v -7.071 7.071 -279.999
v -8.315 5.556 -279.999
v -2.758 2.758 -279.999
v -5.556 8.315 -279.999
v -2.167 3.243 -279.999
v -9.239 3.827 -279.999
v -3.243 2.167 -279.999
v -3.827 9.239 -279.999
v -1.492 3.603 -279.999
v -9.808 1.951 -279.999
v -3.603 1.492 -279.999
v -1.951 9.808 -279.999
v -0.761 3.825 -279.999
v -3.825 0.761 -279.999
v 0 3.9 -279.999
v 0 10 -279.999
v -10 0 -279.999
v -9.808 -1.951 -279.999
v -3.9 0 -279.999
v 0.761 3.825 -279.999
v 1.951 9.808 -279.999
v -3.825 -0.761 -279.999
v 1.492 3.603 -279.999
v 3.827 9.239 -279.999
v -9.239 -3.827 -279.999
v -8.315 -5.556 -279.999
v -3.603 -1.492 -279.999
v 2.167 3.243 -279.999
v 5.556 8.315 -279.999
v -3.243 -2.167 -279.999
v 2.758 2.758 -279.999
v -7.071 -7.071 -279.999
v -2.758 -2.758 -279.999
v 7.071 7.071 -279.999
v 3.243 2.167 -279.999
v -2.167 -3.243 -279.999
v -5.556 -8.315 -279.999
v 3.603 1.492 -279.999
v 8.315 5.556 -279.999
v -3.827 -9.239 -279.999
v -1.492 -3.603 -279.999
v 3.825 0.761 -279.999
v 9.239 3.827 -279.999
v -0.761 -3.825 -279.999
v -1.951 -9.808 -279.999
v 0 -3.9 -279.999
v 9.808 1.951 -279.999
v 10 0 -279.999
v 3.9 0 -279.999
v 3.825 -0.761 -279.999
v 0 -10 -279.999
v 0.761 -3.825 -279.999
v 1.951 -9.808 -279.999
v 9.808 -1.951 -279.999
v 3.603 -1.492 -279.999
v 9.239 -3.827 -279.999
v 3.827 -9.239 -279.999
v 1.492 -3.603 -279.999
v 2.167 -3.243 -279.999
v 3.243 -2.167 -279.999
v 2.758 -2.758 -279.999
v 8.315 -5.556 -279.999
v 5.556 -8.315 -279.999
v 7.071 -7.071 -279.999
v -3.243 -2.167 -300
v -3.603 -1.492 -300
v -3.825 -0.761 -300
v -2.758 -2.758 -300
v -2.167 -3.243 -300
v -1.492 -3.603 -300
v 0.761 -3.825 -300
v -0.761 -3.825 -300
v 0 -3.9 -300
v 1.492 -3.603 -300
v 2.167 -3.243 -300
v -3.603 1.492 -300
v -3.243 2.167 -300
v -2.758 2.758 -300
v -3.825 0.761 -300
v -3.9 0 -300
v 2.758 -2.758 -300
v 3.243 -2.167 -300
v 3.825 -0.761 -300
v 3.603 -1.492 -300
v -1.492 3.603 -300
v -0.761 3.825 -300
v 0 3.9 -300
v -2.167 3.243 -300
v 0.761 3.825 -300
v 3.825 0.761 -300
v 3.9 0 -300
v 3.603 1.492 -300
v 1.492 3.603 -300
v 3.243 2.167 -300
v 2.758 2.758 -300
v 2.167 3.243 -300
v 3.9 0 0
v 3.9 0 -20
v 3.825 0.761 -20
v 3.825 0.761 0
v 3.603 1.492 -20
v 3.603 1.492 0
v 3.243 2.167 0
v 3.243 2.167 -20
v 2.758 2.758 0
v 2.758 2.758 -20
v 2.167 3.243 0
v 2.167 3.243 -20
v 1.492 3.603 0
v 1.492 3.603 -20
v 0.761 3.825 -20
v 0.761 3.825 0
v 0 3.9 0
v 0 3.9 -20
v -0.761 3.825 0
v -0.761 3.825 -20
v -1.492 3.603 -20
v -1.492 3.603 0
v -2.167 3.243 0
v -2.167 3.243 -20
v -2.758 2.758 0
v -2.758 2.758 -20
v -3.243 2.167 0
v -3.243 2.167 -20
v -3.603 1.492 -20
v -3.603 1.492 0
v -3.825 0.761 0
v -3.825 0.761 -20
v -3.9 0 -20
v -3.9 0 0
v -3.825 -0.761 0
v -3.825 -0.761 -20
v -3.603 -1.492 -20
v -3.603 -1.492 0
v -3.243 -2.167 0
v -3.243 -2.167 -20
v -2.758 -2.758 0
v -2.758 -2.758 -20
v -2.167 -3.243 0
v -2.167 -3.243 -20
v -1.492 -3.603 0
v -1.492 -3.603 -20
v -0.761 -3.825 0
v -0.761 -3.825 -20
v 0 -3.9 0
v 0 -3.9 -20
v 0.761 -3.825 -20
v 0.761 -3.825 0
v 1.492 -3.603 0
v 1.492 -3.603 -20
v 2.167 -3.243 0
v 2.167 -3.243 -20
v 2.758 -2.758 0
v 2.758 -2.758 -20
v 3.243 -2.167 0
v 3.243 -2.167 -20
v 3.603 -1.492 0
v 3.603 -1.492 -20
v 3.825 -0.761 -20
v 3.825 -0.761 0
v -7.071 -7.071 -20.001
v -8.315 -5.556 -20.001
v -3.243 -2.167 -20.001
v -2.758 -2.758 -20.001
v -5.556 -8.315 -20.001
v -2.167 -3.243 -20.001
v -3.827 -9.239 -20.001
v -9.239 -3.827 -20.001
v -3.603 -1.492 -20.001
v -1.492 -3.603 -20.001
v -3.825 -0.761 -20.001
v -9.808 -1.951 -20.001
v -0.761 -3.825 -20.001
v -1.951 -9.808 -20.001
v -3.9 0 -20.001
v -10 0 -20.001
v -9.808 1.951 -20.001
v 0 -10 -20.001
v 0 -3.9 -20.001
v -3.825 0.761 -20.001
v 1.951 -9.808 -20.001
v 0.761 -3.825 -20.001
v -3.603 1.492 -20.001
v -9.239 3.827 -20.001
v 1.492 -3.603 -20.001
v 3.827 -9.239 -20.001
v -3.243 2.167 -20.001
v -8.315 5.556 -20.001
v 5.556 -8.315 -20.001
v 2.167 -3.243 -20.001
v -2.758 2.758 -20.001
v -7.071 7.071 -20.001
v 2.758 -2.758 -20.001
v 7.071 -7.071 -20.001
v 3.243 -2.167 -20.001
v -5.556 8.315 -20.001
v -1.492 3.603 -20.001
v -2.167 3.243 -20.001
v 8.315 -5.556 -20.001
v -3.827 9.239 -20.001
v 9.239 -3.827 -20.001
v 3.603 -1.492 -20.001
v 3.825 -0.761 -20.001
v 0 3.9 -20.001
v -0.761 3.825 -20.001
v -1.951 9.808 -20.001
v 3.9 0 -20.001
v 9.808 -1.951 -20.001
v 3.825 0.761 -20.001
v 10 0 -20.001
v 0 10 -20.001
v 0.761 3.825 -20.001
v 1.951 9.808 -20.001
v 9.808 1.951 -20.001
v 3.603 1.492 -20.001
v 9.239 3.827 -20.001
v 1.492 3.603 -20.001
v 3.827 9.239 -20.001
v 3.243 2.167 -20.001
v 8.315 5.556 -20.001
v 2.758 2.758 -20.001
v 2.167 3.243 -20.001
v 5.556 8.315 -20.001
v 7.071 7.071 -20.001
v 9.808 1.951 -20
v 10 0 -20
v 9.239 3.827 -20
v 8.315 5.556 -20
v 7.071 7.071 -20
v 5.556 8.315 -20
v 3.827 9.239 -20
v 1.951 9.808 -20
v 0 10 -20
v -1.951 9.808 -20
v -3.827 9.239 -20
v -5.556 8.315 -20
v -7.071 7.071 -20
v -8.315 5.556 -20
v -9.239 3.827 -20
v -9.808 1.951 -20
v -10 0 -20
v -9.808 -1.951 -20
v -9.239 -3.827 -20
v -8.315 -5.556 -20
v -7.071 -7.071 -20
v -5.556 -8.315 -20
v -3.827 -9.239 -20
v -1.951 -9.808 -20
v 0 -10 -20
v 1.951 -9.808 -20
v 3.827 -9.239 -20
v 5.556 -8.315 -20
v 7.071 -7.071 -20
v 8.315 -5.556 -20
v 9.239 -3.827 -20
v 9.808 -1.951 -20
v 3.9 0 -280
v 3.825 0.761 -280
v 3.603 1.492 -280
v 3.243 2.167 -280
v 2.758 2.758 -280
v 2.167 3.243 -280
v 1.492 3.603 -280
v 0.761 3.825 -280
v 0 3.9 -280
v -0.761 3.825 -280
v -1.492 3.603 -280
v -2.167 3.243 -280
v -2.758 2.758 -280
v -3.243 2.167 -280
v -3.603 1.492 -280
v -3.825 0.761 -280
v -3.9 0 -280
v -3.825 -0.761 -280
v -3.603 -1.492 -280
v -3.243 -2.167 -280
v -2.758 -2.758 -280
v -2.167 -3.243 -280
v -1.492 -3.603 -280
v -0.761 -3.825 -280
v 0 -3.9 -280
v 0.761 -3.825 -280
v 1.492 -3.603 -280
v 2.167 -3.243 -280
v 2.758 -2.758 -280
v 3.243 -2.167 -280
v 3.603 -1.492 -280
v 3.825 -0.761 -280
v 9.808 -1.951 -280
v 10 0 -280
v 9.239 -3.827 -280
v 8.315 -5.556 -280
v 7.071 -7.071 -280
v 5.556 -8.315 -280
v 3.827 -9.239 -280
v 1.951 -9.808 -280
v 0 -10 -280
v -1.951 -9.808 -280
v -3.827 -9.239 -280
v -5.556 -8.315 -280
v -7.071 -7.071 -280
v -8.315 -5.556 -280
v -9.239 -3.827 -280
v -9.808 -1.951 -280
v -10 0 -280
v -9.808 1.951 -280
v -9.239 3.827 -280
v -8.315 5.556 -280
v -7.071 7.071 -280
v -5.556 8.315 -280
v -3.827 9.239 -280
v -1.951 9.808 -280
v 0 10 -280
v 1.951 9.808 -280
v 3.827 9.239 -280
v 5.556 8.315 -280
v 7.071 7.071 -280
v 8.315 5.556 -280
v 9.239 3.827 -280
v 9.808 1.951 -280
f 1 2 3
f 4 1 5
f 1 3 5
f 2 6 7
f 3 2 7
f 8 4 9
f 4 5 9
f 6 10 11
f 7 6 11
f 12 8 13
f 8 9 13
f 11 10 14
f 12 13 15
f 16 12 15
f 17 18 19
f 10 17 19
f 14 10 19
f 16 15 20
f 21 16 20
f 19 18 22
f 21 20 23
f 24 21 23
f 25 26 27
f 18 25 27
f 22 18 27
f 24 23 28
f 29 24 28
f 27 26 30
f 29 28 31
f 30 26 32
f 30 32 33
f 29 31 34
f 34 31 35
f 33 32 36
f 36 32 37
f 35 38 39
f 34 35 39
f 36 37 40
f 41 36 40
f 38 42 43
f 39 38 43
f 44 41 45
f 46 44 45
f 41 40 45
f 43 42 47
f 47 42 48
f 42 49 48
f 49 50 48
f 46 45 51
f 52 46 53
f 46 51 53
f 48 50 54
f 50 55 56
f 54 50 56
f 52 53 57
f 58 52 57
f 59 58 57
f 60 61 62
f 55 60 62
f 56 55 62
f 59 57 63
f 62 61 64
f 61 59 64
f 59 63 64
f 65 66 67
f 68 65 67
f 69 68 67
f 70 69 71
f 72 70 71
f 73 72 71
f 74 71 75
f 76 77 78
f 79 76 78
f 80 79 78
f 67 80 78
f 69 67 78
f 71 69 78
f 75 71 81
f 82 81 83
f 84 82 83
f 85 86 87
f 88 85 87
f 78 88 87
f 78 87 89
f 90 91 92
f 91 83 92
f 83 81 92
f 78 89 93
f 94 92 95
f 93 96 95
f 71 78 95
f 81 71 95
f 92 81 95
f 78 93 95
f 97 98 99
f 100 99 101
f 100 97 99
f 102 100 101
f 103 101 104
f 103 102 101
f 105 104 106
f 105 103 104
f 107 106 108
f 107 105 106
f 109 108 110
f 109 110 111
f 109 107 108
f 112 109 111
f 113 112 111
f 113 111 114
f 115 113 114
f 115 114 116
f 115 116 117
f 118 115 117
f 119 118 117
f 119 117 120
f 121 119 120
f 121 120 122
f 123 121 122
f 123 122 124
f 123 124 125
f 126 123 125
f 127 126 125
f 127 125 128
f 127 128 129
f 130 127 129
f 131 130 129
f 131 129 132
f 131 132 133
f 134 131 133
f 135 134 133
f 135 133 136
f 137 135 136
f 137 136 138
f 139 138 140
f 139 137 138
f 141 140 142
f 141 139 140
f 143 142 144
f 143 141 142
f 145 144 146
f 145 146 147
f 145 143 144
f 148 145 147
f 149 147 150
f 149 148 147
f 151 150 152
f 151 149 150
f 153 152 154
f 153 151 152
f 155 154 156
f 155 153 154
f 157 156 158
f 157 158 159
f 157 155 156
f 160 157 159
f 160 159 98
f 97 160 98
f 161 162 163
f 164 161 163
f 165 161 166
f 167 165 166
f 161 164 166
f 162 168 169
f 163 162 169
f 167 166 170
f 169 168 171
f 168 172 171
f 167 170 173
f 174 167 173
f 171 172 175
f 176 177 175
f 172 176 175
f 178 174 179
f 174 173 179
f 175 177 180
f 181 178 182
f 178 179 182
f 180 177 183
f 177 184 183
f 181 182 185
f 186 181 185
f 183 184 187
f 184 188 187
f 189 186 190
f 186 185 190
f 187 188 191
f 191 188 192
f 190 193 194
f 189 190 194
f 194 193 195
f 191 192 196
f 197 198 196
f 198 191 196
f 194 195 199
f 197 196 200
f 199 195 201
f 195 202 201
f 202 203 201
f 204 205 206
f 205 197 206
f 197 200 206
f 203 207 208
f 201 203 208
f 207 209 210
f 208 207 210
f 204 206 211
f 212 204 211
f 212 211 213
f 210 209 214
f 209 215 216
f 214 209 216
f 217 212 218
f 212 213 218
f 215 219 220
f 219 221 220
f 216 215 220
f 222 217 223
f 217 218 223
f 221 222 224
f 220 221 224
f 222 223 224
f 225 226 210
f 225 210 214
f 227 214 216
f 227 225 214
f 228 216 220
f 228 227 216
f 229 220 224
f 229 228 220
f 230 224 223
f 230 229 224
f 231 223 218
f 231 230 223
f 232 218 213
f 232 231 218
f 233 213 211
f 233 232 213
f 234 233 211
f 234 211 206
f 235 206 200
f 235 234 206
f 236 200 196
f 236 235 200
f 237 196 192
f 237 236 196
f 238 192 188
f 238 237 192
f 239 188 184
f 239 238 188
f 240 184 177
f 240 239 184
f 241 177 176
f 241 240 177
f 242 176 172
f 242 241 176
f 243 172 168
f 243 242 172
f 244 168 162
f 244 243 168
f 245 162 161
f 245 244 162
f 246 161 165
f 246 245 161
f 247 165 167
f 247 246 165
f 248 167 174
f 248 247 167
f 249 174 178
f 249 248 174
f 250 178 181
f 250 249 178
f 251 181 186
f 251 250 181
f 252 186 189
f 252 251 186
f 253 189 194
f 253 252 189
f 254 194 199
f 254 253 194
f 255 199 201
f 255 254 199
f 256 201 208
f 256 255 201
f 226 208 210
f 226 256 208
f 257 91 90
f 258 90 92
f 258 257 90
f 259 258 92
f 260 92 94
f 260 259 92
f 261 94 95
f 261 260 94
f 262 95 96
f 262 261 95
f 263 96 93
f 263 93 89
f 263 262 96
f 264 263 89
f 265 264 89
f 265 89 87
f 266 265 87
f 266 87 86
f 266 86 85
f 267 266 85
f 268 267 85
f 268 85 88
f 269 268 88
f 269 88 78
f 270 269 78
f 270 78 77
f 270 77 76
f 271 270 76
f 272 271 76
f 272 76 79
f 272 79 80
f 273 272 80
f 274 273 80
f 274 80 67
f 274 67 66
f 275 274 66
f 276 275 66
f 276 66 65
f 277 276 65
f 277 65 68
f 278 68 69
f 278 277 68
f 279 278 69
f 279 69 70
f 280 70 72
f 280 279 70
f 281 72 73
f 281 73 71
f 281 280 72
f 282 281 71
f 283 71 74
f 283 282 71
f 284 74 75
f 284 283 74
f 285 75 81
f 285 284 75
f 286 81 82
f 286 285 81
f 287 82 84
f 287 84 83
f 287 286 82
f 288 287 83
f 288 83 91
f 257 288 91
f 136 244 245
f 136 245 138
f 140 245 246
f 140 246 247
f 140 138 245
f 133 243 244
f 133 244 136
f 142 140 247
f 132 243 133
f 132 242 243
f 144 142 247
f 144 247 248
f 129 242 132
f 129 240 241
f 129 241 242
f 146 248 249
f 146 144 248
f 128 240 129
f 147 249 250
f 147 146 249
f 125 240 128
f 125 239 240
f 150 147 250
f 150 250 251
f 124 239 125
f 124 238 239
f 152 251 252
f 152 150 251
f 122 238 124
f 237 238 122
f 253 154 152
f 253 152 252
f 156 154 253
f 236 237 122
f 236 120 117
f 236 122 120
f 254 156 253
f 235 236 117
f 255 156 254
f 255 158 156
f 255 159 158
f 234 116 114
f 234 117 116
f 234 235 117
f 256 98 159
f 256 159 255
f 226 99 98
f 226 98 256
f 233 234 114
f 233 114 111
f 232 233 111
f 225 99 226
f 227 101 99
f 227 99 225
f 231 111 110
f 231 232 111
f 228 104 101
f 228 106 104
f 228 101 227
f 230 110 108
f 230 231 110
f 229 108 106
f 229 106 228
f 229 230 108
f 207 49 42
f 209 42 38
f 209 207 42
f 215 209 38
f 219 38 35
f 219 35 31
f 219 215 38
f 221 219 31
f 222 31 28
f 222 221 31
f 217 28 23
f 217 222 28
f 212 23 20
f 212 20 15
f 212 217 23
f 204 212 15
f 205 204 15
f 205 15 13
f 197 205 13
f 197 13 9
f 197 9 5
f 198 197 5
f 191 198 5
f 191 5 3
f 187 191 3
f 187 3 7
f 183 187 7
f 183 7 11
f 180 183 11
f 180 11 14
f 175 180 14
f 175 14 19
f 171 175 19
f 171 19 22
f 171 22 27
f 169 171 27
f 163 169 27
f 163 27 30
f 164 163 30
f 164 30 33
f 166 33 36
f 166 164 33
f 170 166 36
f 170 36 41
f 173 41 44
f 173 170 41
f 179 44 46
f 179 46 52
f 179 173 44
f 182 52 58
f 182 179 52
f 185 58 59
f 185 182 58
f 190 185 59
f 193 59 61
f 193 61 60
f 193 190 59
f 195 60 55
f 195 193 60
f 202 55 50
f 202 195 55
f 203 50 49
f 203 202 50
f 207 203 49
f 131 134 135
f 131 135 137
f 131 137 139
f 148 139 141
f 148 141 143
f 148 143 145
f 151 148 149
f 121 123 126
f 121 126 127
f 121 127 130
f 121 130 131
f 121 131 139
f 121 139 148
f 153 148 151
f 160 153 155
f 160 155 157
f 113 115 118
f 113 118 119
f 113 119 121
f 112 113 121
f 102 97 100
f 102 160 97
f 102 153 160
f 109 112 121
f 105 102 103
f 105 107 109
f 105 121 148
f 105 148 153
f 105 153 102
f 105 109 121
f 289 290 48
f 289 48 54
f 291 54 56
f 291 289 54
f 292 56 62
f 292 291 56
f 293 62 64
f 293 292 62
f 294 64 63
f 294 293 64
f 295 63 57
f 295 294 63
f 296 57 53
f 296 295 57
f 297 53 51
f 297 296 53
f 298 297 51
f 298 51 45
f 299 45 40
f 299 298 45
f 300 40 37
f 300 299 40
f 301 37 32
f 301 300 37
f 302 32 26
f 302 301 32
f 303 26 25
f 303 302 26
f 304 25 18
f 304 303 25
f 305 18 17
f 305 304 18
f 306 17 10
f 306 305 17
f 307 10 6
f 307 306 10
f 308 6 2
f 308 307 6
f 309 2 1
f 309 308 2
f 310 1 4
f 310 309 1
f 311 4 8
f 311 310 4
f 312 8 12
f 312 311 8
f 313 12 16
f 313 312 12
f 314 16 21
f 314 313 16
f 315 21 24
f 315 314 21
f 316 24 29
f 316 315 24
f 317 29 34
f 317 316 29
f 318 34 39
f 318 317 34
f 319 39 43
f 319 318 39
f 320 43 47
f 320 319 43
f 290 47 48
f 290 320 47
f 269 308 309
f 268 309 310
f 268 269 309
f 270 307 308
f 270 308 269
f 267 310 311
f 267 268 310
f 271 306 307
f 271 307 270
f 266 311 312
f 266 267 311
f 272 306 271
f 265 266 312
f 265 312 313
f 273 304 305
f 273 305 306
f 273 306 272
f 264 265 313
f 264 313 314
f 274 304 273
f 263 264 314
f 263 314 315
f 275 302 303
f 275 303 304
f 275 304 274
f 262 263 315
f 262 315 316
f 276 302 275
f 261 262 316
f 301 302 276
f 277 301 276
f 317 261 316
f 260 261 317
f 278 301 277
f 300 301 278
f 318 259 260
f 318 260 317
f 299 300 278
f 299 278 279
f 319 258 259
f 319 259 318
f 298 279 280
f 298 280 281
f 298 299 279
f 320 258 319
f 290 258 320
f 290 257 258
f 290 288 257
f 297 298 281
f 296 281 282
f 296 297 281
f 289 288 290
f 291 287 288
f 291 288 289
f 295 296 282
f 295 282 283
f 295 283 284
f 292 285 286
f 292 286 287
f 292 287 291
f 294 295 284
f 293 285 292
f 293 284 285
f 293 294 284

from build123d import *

# Parameters (mm, degrees)
F0_R     = 3.9
F1_DEPTH = 300
F3_R     = 10
F4_DEPTH = 0.001
F6_R     = 10
F7_DEPTH = 0.001


with BuildPart() as f1:
    # F0 (on Top) → F1 (new body)
    with BuildSketch(Plane.XY):
        Circle(F0_R)
    extrude(amount=-F1_DEPTH)

    # F3 (on offset) → F4 (join)
    with BuildSketch(Plane(origin=(0, 0, -280), x_dir=(1, 0, 0), z_dir=(0, 0, -1))):
        Circle(F3_R)
    extrude(amount=-F4_DEPTH)

    # F6 (on offset) → F7 (join)
    with BuildSketch(Plane.XY.offset(-20)):
        Circle(F6_R)
    extrude(amount=-F7_DEPTH)


solid = f1.part
